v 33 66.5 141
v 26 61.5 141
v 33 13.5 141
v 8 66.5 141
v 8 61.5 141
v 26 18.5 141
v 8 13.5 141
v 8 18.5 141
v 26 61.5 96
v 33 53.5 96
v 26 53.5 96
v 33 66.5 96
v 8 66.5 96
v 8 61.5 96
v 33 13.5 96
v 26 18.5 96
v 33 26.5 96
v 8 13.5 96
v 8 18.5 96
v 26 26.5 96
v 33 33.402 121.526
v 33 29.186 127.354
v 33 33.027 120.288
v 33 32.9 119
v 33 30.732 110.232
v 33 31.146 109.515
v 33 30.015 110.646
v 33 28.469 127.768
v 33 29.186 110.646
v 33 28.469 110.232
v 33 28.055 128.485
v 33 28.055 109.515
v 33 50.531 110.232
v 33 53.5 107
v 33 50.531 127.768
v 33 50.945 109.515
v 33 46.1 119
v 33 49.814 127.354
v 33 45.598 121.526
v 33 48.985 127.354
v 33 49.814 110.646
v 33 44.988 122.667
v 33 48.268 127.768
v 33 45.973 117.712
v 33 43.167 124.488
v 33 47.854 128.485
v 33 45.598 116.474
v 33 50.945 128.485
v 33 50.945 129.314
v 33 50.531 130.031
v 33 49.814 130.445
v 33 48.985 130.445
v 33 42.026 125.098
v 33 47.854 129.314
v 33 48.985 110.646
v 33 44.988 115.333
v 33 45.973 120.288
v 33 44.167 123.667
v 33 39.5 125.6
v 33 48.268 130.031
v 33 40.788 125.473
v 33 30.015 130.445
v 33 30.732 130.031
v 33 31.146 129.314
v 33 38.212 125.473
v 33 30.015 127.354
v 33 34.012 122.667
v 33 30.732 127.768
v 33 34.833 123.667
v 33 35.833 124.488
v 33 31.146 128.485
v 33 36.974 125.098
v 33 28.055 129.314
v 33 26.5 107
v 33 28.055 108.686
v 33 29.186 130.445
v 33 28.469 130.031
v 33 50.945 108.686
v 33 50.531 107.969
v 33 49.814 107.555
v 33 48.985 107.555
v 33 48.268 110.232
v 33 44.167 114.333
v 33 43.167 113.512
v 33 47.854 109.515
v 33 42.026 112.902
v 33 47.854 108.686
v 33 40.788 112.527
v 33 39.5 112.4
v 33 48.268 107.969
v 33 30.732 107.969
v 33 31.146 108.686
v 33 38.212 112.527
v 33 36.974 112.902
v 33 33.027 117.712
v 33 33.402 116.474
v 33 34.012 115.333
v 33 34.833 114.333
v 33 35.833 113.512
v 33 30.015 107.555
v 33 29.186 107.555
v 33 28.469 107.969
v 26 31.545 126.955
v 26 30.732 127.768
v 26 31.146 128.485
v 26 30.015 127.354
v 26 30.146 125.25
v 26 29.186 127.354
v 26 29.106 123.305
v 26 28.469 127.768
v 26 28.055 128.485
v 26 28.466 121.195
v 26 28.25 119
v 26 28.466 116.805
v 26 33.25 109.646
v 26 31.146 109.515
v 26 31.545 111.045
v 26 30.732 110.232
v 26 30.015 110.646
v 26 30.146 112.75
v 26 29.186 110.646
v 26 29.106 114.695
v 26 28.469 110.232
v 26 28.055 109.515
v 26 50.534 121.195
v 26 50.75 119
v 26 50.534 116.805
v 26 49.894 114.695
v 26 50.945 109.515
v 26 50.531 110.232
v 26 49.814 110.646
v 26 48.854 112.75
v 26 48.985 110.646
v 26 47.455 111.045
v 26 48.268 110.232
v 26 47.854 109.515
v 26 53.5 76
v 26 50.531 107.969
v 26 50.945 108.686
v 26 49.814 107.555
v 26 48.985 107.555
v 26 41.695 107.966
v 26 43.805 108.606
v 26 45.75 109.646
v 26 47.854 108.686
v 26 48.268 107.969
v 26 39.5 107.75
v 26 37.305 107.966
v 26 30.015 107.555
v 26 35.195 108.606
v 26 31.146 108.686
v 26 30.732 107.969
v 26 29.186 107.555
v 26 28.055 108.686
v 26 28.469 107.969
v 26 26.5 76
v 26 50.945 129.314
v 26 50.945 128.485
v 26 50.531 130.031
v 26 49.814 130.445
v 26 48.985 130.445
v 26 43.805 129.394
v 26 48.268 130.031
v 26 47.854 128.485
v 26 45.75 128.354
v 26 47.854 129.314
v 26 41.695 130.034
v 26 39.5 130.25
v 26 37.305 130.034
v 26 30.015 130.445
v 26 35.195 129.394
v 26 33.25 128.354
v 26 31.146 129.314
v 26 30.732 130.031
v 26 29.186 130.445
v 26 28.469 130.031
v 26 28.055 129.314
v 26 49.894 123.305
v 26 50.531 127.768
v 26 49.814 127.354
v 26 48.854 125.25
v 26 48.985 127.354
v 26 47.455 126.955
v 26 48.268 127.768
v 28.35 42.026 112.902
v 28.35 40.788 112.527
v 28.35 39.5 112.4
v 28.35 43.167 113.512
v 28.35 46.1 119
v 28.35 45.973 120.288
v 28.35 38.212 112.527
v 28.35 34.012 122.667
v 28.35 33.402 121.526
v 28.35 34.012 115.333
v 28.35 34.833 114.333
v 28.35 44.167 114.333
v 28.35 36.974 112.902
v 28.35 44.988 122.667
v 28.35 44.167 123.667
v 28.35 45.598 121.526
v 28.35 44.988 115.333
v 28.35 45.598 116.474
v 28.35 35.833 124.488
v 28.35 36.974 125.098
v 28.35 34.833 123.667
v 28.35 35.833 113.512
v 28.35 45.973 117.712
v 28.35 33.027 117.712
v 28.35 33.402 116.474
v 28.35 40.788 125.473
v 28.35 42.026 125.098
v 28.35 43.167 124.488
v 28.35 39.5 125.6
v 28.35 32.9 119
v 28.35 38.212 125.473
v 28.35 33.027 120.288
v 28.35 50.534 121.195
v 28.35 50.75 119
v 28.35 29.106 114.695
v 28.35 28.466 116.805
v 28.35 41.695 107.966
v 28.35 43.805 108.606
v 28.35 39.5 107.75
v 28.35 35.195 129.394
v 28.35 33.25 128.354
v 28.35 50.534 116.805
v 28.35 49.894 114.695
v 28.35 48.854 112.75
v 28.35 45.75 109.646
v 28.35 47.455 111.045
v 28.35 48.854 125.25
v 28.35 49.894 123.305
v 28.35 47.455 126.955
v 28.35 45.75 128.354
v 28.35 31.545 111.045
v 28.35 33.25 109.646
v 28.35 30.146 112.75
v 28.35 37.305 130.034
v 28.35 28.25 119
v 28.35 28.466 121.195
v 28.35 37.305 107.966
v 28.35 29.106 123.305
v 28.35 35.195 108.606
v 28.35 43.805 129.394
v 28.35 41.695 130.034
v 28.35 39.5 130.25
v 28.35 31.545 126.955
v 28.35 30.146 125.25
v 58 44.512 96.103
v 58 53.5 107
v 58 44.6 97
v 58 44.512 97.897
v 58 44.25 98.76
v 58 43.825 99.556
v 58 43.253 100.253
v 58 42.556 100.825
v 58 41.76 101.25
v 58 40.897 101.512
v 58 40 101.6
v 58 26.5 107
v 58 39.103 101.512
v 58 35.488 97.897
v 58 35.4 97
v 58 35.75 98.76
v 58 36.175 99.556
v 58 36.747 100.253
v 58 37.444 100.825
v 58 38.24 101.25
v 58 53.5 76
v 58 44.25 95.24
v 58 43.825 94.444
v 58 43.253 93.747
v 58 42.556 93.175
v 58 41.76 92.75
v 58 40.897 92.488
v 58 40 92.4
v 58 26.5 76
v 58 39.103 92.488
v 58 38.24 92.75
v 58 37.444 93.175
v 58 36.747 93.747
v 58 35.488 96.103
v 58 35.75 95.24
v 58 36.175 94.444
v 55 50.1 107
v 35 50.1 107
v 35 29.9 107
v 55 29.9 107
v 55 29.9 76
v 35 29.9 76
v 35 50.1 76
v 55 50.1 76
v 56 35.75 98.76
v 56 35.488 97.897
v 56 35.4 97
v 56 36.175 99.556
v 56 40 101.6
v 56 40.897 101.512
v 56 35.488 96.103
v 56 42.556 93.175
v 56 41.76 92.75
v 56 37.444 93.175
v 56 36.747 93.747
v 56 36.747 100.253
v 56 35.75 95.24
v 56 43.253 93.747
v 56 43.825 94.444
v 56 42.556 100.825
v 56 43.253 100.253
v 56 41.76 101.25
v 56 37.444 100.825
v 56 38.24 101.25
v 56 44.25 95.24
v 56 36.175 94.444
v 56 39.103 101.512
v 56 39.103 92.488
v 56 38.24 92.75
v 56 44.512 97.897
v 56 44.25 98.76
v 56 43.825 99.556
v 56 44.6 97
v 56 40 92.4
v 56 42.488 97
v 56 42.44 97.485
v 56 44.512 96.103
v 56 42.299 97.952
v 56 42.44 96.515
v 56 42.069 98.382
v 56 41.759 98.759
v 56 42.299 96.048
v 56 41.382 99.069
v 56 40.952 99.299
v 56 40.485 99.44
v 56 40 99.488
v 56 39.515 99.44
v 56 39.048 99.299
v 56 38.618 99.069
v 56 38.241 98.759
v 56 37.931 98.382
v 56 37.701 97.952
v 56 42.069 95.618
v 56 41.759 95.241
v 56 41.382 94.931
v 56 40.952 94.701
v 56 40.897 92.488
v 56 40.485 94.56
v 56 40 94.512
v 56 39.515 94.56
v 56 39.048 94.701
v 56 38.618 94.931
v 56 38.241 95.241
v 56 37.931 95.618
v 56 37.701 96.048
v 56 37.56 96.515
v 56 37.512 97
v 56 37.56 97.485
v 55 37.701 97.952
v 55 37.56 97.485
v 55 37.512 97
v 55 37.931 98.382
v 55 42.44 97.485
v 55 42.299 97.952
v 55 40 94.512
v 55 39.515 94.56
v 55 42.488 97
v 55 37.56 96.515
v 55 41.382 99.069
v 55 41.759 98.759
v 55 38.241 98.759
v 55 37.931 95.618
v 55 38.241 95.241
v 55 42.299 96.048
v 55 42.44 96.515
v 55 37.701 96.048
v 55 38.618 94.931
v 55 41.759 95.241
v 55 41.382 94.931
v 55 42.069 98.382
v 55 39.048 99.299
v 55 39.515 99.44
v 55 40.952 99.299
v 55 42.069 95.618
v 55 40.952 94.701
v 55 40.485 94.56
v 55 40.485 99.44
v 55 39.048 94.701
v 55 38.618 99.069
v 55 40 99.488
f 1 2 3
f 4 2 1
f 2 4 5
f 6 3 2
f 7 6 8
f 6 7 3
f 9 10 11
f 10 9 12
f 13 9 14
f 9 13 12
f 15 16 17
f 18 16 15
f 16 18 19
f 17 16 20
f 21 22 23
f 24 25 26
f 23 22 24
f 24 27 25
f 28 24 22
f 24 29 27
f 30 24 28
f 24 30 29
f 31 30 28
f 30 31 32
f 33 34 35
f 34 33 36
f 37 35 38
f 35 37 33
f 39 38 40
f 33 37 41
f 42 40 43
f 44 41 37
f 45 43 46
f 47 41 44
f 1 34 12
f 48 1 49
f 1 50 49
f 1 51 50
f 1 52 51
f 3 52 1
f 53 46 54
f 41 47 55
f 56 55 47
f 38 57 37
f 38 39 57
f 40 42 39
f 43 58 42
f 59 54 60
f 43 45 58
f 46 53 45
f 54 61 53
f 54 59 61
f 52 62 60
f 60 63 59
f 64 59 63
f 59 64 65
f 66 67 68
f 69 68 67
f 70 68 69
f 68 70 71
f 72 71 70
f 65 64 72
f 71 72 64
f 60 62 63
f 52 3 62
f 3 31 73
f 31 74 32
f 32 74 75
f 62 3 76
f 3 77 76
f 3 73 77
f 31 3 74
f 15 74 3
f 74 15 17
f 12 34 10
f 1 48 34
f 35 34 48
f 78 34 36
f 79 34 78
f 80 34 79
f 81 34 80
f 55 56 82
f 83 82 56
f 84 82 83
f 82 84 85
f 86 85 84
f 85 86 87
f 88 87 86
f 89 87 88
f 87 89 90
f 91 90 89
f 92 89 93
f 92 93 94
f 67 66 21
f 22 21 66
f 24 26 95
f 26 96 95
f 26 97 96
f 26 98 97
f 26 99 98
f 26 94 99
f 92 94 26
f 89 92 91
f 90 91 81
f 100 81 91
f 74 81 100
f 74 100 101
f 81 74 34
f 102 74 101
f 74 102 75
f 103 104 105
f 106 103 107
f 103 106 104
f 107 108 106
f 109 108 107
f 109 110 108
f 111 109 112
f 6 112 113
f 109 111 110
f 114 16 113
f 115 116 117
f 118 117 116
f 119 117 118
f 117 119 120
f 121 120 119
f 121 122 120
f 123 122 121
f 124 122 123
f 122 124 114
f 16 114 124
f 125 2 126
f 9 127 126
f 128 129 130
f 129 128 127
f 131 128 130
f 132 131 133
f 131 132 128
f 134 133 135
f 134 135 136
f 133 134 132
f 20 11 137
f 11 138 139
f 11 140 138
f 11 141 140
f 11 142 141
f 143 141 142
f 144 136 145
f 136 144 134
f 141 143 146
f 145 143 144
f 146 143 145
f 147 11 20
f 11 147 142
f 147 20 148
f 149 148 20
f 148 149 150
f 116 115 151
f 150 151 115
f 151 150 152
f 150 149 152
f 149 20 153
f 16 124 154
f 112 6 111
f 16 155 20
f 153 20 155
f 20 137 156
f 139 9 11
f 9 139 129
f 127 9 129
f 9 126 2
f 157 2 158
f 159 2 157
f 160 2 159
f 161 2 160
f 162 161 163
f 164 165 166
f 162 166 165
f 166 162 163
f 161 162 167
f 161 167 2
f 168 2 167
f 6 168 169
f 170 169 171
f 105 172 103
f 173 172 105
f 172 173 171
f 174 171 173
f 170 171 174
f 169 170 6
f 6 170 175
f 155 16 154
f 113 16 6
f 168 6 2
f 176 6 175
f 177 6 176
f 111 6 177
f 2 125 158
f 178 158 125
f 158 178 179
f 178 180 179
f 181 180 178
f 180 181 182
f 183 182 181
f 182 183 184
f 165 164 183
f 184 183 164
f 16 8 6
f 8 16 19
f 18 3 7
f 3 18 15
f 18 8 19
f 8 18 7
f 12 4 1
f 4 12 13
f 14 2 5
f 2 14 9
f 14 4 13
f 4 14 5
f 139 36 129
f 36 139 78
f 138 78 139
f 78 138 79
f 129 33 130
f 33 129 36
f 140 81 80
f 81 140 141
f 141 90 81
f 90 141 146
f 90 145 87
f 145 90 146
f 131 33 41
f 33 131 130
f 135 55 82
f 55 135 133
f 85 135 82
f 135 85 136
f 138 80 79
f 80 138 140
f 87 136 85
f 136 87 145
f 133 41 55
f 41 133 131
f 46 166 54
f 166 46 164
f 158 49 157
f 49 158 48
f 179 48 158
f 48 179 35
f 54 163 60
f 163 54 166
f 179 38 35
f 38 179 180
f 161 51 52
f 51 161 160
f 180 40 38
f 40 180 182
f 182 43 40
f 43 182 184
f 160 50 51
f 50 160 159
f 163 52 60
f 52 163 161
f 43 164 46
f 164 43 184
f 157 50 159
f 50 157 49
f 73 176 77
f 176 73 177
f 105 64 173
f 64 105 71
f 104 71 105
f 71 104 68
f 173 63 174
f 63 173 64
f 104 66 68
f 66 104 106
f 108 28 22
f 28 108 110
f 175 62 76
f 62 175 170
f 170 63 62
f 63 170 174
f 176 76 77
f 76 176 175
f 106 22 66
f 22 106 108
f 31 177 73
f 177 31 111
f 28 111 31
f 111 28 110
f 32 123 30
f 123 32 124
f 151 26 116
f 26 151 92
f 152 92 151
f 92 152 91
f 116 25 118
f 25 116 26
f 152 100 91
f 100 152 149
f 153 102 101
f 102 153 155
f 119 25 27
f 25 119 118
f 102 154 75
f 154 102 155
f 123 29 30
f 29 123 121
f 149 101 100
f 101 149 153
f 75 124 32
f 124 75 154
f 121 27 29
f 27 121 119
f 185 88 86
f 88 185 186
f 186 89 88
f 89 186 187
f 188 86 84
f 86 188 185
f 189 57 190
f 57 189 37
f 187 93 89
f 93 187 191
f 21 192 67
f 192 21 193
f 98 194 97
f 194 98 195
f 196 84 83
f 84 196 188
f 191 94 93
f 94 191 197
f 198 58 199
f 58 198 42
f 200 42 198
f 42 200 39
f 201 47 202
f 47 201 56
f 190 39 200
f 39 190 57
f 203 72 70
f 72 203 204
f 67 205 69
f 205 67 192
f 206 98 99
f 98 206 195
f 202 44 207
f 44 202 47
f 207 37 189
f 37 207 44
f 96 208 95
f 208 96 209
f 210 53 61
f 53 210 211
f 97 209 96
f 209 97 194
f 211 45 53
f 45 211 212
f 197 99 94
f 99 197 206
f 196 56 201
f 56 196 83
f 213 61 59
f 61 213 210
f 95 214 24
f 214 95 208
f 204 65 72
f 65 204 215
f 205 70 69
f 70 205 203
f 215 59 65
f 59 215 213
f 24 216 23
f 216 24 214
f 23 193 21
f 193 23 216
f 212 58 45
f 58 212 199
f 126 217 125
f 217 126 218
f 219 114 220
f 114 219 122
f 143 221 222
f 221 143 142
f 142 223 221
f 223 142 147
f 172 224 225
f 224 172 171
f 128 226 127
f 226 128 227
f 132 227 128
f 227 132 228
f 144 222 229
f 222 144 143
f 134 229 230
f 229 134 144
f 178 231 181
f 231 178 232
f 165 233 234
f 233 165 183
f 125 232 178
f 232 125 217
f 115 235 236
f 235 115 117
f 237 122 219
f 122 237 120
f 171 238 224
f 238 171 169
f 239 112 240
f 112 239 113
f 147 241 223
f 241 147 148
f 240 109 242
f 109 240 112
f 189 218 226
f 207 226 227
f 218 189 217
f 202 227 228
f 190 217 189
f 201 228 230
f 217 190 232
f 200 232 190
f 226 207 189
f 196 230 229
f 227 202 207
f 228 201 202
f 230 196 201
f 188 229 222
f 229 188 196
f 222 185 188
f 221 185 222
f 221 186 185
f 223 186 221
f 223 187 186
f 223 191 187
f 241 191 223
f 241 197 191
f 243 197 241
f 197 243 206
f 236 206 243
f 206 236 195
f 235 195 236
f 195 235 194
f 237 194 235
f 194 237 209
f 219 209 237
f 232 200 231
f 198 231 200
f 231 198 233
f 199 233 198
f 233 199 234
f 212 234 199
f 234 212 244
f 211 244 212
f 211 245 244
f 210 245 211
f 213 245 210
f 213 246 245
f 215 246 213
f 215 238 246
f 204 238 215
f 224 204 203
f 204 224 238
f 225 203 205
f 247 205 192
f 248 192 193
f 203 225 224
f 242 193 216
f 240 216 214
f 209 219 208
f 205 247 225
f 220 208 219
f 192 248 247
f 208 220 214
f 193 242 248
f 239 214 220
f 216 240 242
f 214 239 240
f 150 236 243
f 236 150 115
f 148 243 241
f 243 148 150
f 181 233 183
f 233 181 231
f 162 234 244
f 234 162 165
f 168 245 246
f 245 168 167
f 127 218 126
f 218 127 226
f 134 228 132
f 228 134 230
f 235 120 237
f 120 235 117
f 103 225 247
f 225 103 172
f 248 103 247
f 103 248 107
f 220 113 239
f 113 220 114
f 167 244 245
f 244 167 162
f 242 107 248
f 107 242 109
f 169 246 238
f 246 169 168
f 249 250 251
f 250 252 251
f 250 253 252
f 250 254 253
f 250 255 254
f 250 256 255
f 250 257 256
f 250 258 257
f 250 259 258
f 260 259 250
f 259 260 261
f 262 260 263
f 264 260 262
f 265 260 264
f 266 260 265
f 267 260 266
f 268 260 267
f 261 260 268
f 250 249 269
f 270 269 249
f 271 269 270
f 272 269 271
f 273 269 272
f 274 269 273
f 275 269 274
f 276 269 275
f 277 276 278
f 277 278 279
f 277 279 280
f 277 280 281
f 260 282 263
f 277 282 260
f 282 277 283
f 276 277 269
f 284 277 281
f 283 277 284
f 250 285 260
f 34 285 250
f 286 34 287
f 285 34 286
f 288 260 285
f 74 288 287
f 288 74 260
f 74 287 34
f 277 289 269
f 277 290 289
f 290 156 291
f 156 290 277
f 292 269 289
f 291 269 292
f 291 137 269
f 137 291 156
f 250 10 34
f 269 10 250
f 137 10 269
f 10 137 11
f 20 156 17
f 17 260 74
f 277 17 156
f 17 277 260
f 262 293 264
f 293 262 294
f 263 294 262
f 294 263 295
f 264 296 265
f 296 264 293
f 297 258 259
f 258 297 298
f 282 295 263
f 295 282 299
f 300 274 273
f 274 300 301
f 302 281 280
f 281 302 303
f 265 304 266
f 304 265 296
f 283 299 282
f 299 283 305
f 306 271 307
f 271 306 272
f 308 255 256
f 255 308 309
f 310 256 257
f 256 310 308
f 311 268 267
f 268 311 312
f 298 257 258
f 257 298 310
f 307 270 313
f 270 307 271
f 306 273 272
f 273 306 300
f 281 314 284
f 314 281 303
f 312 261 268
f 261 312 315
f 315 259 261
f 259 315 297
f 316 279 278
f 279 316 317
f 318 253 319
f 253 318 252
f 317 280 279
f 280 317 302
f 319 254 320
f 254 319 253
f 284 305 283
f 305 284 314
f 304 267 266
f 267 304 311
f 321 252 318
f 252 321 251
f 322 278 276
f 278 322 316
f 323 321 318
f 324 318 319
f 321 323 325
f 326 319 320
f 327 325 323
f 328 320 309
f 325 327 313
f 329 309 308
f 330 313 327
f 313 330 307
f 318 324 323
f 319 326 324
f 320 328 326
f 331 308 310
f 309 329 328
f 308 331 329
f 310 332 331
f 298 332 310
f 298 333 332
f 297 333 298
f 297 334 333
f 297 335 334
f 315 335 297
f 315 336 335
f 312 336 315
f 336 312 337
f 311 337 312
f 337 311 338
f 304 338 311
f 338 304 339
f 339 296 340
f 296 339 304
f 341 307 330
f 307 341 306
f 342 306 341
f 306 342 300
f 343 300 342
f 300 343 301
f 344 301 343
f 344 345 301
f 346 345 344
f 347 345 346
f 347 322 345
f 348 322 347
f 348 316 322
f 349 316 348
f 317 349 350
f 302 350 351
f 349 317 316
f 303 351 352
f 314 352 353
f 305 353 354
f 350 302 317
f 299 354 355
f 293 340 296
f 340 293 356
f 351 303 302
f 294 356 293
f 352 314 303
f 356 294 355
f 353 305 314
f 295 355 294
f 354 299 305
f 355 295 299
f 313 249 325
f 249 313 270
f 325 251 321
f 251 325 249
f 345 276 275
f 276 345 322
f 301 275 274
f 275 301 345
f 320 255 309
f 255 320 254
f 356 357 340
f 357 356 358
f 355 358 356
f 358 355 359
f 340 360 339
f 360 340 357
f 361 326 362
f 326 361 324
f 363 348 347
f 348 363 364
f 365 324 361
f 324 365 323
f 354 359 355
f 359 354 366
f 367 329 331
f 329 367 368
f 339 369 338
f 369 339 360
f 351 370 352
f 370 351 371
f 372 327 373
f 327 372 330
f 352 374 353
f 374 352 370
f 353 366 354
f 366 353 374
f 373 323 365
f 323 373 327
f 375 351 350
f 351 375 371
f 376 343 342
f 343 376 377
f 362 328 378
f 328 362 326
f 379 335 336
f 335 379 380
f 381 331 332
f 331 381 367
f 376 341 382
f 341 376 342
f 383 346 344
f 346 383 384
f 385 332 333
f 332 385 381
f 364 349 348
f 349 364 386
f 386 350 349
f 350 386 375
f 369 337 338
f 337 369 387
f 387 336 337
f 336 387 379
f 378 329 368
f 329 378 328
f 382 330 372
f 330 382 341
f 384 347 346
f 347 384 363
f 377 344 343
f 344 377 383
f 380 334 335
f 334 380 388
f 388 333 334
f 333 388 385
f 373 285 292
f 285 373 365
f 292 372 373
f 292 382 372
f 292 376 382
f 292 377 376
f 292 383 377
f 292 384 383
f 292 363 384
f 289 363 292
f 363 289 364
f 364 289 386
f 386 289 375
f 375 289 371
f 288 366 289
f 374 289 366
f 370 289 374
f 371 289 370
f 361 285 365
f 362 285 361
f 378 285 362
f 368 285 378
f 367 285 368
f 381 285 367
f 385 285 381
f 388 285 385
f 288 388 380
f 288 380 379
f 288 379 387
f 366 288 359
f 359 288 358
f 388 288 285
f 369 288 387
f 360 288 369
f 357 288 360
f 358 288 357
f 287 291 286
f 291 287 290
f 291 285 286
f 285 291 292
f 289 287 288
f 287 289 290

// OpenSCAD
// file: MCAD/constants.scad
// MIT license


TAU = 6.2831853071; //2*PI, see http://tauday.com/
PI = TAU/2;

// translates a imperial measurement in inches to meters
mm_per_inch = 25.4;
// file: MCAD/math.scad
// MIT license

include <constants.scad>

function deg(angle) = 360*angle/TAU;
// file: MCAD/motors.scad
// Copyright 2010 D1plo1d

// This library is dual licensed under the GPL 3.0 and the GNU Lesser General Public License as per http://creativecommons.org/licenses/LGPL/2.1/ .

include <math.scad>


//generates a motor mount for the specified nema standard #.
module stepper_motor_mount(nema_standard,slide_distance=0, mochup=true, tolerance=0) {
	//dimensions from:
	// http://www.numberfactory.com/NEMA%20Motor%20Dimensions.htm
	if (nema_standard == 17)
	{
		_stepper_motor_mount(
			motor_shaft_diameter = 0.1968*mm_per_inch,
			motor_shaft_length = 0.945*mm_per_inch,
			pilot_diameter = 0.866*mm_per_inch,
			pilot_length = 0.80*mm_per_inch,
			mounting_bolt_circle = 1.725*mm_per_inch,
			bolt_hole_size = 3.5,
			bolt_hole_distance = 1.220*mm_per_inch,
			slide_distance = slide_distance,
			mochup = mochup,
			tolerance=tolerance);
	}
	if (nema_standard == 23)
	{
		_stepper_motor_mount(
			motor_shaft_diameter = 0.250*mm_per_inch,
			motor_shaft_length = 0.81*mm_per_inch,
			pilot_diameter = 1.500*mm_per_inch,
			pilot_length = 0.062*mm_per_inch,
			mounting_bolt_circle = 2.625*mm_per_inch,
			bolt_hole_size = 0.195*mm_per_inch,
			bolt_hole_distance = 1.856*mm_per_inch,
			slide_distance = slide_distance,
			mochup = mochup,
			tolerance=tolerance);
	}
	
}


//inner mehod for creating a stepper motor mount of any dimensions
module _stepper_motor_mount(
	motor_shaft_diameter,
	motor_shaft_length,
	pilot_diameter,
	pilot_length,
	mounting_bolt_circle,
	bolt_hole_size,
	bolt_hole_distance,
	slide_distance = 0,
	motor_length = 40, //arbitray - not standardized
	mochup,
	tolerance = 0
)
{
	union()
	{
	// == centered mount points ==
	//mounting circle inset
	translate([0,slide_distance/2,0]) circle(r = pilot_diameter/2 + tolerance);
	square([pilot_diameter,slide_distance],center=true);
	translate([0,-slide_distance/2,0]) circle(r = pilot_diameter/2 + tolerance);

	//todo: motor shaft hole
	
	//mounting screw holes
	for (x = [-1,1])
	{
		for (y = [-1,1])
		{
			translate([x*bolt_hole_distance/2,y*bolt_hole_distance/2,0])
			{
				translate([0,slide_distance/2,0]) circle(bolt_hole_size/2 + tolerance);
				translate([0,-slide_distance/2,0]) circle(bolt_hole_size/2 + tolerance);
				square([bolt_hole_size+2*tolerance,slide_distance],center=true);
			}
		}
	}
	// == motor mock-up ==
	//motor box
	if (mochup == true)
	{
		%translate([0,0,-5]) cylinder(h = 5, r = pilot_diameter/2);
		%translate(v=[0,0,-motor_length/2])
		{
			cube(size=[bolt_hole_distance+bolt_hole_size+5,bolt_hole_distance+bolt_hole_size+5,motor_length], center = true);
		}
		//shaft
		%translate(v=[0,0,-(motor_length-motor_shaft_length-2)/2])
		{
			%cylinder(r=motor_shaft_diameter/2,h=motor_length+motor_shaft_length--1, center = true);
		}
	}
	}
}
// file: triangle.scad
//Copyright Austin Floyd 2013
//http://www.thingiverse.com/thing:119050
//license GNU GPL
//austin.floyd at 3DprintGeeks (dot) com

//global variables.. if not set when calling wedge it will use these values. 
//The prefix st_ is to "namespace" the global variables so they're not accidentally overridden elsewhere


//The top angle of the right triangle
st_wedgeAngle=12; // [0.01:89.99]

//The height of the triangle (width auto-generated based on this)
st_wedgeHeight=27; // [0.01:200]

//Depth (thickness) of triangle
st_wedgeWidth=2.2; // [0.01:200]

//Increased or decreased percentage (50% would be 0.5) of top point vs bottom point
st_topFactor=0.5; // [0,0.1,0.2,0.3,0.4,0.5,0.6,0.7,0.8,0.9,1]

//Whether or not to center on x/y/z
st_center=false; // [true, false]

//Flip it upside down
st_invert=false; // [true, false]

//default wedge
//wedge();

//demo of several different wedges
demo();

module demo() {
	translate([0,0,15])
	wedge(angle=75,height=10, wedgeWidth=5);

	wedge(angle=75,height=5,topFactor=.25, center=true, wedgeWidth=10);

	translate([0,0,-15])
	wedge(angle=35,height=13,center=true);

	translate([0,0,-30])
	wedge(angle=35,height=6, center=true, invert=true);
}


module wedge(angle=st_wedgeAngle, height=st_wedgeHeight, wedgeWidth=st_wedgeWidth, topFactor=st_topFactor, center=st_center, invert=st_invert) {
	angle2=180-90-angle;
	hyp=height/sin(angle2);
	width=sqrt(pow(hyp,2)-pow(height,2));
	if (!invert) {
		triangle(height, width, center, topFactor, wedgeWidth);
	}
	if (invert) {
		rotate(180,[1,0,0])
		triangle(height, width, center, topFactor, wedgeWidth);
	}
}
module triangle(height=5, width=5, center=false, topFactor=0.5, wedgeWidth) {
	triangles=[[0,1,4],[5,4,1],		// top
					[1,2,5],[2,3,4],		// sides
					[3,0,4], [4,5,2],	//back
           	[2,1,0], [2,0,3]]; // base
	halfWidth=width/2;
	halfWWidth=wedgeWidth/2;
	topWidth=wedgeWidth*topFactor;
	halfTopWidth=topWidth/2;
	topHalfDiff=(wedgeWidth-topWidth)/2;
	halfHeight=height/2;
	if (center) {
		polyhedron(
  			points=[/*0*/[halfWidth,halfWWidth,-halfHeight],/*1*/[halfWidth,-halfWWidth,-halfHeight],				//front point
					  /*2*/[-halfWidth,-halfWWidth,-halfHeight],       /*3*/[-halfWidth,halfWWidth,-halfHeight], //rear point
           	  /*4*/[-halfWidth,halfTopWidth,height-halfHeight], /*5*/[-halfWidth,-halfTopWidth,height-halfHeight] ], //front/rear top 
  			triangles=triangles
		);
	}
	else {
		polyhedron(
  			points=[/*0*/[width,wedgeWidth,0],         			 /*1*/[width,0,0],				    ////front point
					  /*2*/[0,0,0],       					  			 /*3*/[0,wedgeWidth,0], 		    //rear point
           	  /*4*/[0,wedgeWidth-topHalfDiff,height],/*5*/[0,topHalfDiff,height] ],//front/back top 
  			triangles=triangles
		);
	}
}
// file: pulley.scad
use <MCAD/nuts_and_bolts.scad>;

module pulley_wall(xside)
{
   hull(){
       translate([0,0,0]) cube([20,3,2]);
       translate([8.5,0,18]) cube([3,3,2]);
       if (xside==0){
          translate([8.5,7,0]) cube([1,1,1]);
          translate([10,4,9]) rotate([90,0,0]) cylinder(r=3,h=10);
          
         } else {
          translate([8.5,-5,0]) cube([1,1,1]);
          translate([10,8,9]) rotate([90,0,0]) cylinder(r=3,h=10);
         }
       }
    
}

module pulley_body()
{
    translate([0,0,0])   pulley_wall(1);
    translate([0,22,0])  pulley_wall(0);
    %translate([10,-2,9]) rotate([90,0,180]) boltHole(3,length=28);
    %translate([10,27,9]) rotate([90,0,180]) nutHole(3); 
}

module pulley_cuts()
{
    translate([10,-2,9]) rotate([90,0,180]) boltHole(3,length=28);
    translate([10,25,9]) rotate([90,0,180]) nutHole(3);  
    translate([10,27,9]) rotate([90,0,180]) nutHole(3); 
}

module pulley()
{
	difference(){
        translate([23,21,-12]) rotate([90,0,270]) pulley_body();
        translate([23,21,-12]) rotate([90,0,270]) pulley_cuts();
        }
    

}



pulley();
// file: sensor.scad
module sensor_mount_body()
{
 union() { 
      translate([44,2,0]) rotate([90,0,0]) cube([10,15,4]); 
      translate([44,18,0]) rotate([90,0,0]) cube([10,15,4]);
      
      translate([50,-2,0]) rotate([90,0,90]) cube([20,15,4]);
    //  translate([0,-2,0]) rotate([90,0,90]) cube([20,15,4]);
      
      
      }
}

module sensor_mount_cuts()
{

      translate([50,7.5,7.5]) rotate([90, 0, 90]) cylinder(r=2.5, h=10, center=true, $fn=12);

}

module sensor_mount()
{
   difference() {
    sensor_mount_body();
    sensor_mount_cuts();
    
     
     }
}

sensor_mount();
// file: nemamount.scad
include <MCAD/units.scad>;
include <MCAD/materials.scad>
include <MCAD/stepper.scad>
include <MCAD/motors.scad>
use <MCAD/shapes.scad>;
use <pulley.scad>;
$fn = 32;




module motor_support(ht)
{
   difference(){
	  translate([-22.5,23.5,0]) rotate([90,0,0]) motor_support_body(ht);
      translate([0,1,0]) rotate([90,0,0]) motor_support_cuts(ht);
      }
}

module motor_support_body(ht)
{
	cube([45,ht,48.5]);

}


module motor_support_cuts(ht)
{
// Motor shaft/pulley cutout.
      translate([0,.1,0]) rotate([90, 0, 0]) cylinder(r=12, h=ht*2, center=true, $fn=60);
      // NEMA 17 stepper motor mounting screws.
      for (x = [-1, 1]) for (z = [-1, 1]) {
        scale([x, 1, z]) translate([15.5, .1, 15.5]) {
          rotate([90, 0, 0]) cylinder(r=4, h=ht*2, center=true, $fn=12);
          }
        }
}



module nema_geared_cutout()
{
    //pulley opening
    translate([16,1,21]) rotate([90,0,0]){
      cylinder (h=22, r=6.6);

      rotate([0,0,45]) {
        translate([14,0,0]) cylinder(h=22, r=1.6, $fn=12);
        translate([0,14,0]) cylinder(h=22, r=1.6, $fn=12);
        translate([-14,0,0]) cylinder(h=22, r=1.6, $fn=12);
        translate([0,-14,0]) cylinder(h=22, r=1.6, $fn=12);
      }
     
    }

    //gearhead indentation
    translate([16,-5,21]) rotate([90,0,0]) cylinder (h=3.35, r=11.25);

  
    
}

module nema_cutout()
{
// Motor shaft/pulley cutout.
      rotate([90, 0, 0]) cylinder(r=12, h=20, center=true, $fn=60);
      // NEMA 17 stepper motor mounting screws.
      for (x = [-1, 1]) for (z = [-1, 1]) {
        scale([x, 1, z]) translate([15.5, -5, 15.5]) {
          rotate([90, 0, 0]) cylinder(r=1.65, h=20, center=true, $fn=12);
          }
        }
}

module nema_motor()
{
   union(){
     nema_mount();
     %translate([0,-4,1]) rotate([90,0,0]) motor(Nema17, size=NemaLong , dualAxis=false);
     }
}

module nema_motor_inverse()
{
   union(){
     nema_mount_inverse();
     %translate([0,-4,1]) rotate([90,0,0]) motor(Nema17, size=NemaLong , dualAxis=false);
     }
}

module nema_geared_motor_inverse()
{
   union(){
     nema_geared_inverse();
     %translate([16,-7,22]) rotate([90,0,180]) motor(Nema17, NemaLong, dualAxis=false);
    
     }
}

module nema_geared_motor()
{
   union(){
     nema_geared_mount();
     %translate([16,-7,22]) rotate([90,0,180]) motor(Nema17, NemaLong, dualAxis=false);
    
     }
}

module nema_geared_mount()
{
   difference(){
      union(){
           translate([-6,-6,0]) rotate([90,0,0]) cube([45,45,7]);
           translate([-6,-13,-4]) rotate([0,0,0]) cube([45,25,5]);
           translate([-6,-13,44]) rotate([0,0,0]) cube([45,25,5]);
           }
      translate([0,0,1]) nema_geared_cutout();
      }


}

module nema_geared_inverse()
{
   difference(){
      union(){
           translate([-6,-6,0]) rotate([90,0,0]) cube([45,45,7]);
           translate([-6,-31,-4]) rotate([0,0,0]) cube([45,25,5]);
           translate([-6,-31,44]) rotate([0,0,0]) cube([45,25,5]);
           }
      translate([0,0,1]) nema_geared_cutout();
      }


}

module nema_mount_inverse()
{
   difference(){
      union(){
        translate([-22.5,0,-21.5]) rotate([90,0,0]) cube([45,45,5]);
        translate([-22.5,-5,-25]) rotate([0,0,0]) cube([45,25,5]);
        }
      translate([0,0,1]) nema_cutout();
      }
   //nema_cutout();
}

module nema_mount()
{
   difference(){
      union(){
        translate([-22.5,0,-21.5]) rotate([90,0,0]) cube([45,45,5]);
        translate([-22.5,-25,-25]) rotate([0,0,0]) cube([45,25,5]);
        }
      translate([0,0,1]) nema_cutout();
      }
   //nema_cutout();
}

module pulley_mount()
{
   
        translate([-22.5,0,-21.5]) rotate([90,0,0]) cube([45,45,5]);
        translate([-22.5,-25,-25]) rotate([0,0,0]) cube([45,25,5]);
	translate([0,5,0]) rotate([90,0,0]) cylinder(r=18,h=5);
	translate([-11.25,28,0]) rotate([0,0,-90]) pulley();     
}

//nema_motor_inverse();
translate([0,0,40]) rotate([270,0,0]) pulley_mount();
//translate([0,0,0]) motor_support(40);
//nema_geared_motor();
//nema_geared_motor_inverse();
// file: vslot.scad
include <MCAD/units.scad>;
include <MCAD/materials.scad>
use <MCAD/shapes.scad>;
use <bom.scad>;

vslot_color_black = [0.27, 0.27, 0.3];
vslot_color = Aluminum;

module vslot(length=50, sections=1, finish, cutout=0) {
	size = sections * 20;
	bom(str("vslot20x", size, "x", length), str("v-slot 20x", size, " (", length , "mm)"), ["rail", "extrusion", "structure"]);
	cutext = [[12.00,4.50],[10.00,4.50],[8.20,2.78],[8.20,5.50],[6.56,5.50],[3.90,2.84],[3.90,0.21],[3.69,0.00],[3.90,-0.21],[3.90,-2.84],[6.56,-5.50],[8.20,-5.50],[8.20,-2.78],[10.00,-4.50],[12.00,-4.50]];
	cutint = [[16.10,0.21],[16.10,2.84],[12.70,6.24],[12.70,8.78],[7.30,8.78],[7.30,6.24],[3.90,2.84],[3.90,0.21],[3.69,0.00],[3.90,-0.21],[3.90,-2.84],[7.30,-6.24],[7.30,-8.78],[12.70,-8.78],[12.70,-6.24],[16.10,-2.84],[16.10,-0.21],[16.31,0.00],];
	cutcorner = [[8.20,8.20],[6.57,8.20],[6.57,7.66],[7.66,6.57],[8.20,6.57]];

	module profile() {
        
		difference() {
         
			translate([0,0,length/2])
			roundedBox(20 * sections, 20, length, 1.5);
         if (cutout == 0){
			for(i = [0,180]) rotate([0,0,-i]) translate([10 * (sections - 1), 0, -epsilon/2]) {
				linear_extrude(length+20) polygon(cutext);
				translate([5,-2.89,-20]) cube([10,5.78,length+40]);
			}
          
			for(i = [90,270]) rotate([0,0,-i])
				for(j = [0:sections-1]) translate([0, (sections - 1) * 10 - 20 * j, -epsilon/2]) {
					linear_extrude(length+epsilon) polygon(cutext);
					translate([5,-2.89,-20]) cube([10,5.78,length+40]);
				}

			for(i = [0:sections-1]) translate([i * 20 - 10 * (sections - 1),0,-epsilon/2])
				cylinder(length+20, 2.1, 2.1);

			for(i = [90,270]) rotate([0,0,-i])
				translate([0,(sections - 1) * 10,-epsilon/2])
				linear_extrude(length+epsilon) polygon(cutcorner);
			for(i = [ 0,180]) rotate([0,0,-i])
				translate([(sections - 1) * 10,0,-epsilon/2])
				linear_extrude(length+epsilon) polygon(cutcorner);

			if(sections > 1)
				for(i = [0:sections-2]) translate([(sections - 3) * 10 - i * 20, 0, -epsilon/2])
					linear_extrude(length+epsilon) polygon(cutint);
                      }
		}
	}

      if (cutout == 1){
		 translate([0,0,length/2]) box(20 * sections, 20.2, length);
          } else {
	     if(finish)
		   color(finish) profile();
	     else
		   color(vslot_color) profile();
         }
}

module vslot20x20(length, finish) { vslot(length, 1, finish); }
module vslot20x20_cutout(length, finish) { vslot(length, 1, finish, 1); }


module vslot20x40(length, finish) { vslot(length, 2, finish); }
module vslot20x40_cutout(length, finish) { vslot(length, 2, finish, 1); }

module vslot20x60(length, finish) { vslot(length, 3, finish); }
module vslot20x60_cutout(length, finish) { vslot(length, 3, finish, 1); }

module vslot20x80(length, finish) { vslot(length, 4, finish); }
module vslot20x80_cutout(length, finish) { vslot(length, 4, finish, 1); }


module vslot_test() {
	$fn = 32;

	vslot20x20(100);

	translate([0, 40, 0])
	vslot20x40(100, vslot_color_black);

	translate([0, 80, 0])
	vslot20x60(100);

	translate([0, 120, 0])
	vslot20x80(100, vslot_color_black);

    translate([0,140,0]) vslot20x20_cutout(100);
}

vslot_test();
// file: bom.scad
module bom(code, desc, category) {
	echo(str("BOM: ",code," - ", desc, "; ", category));
}
// file: MCAD/nuts_and_bolts.scad
// Copyright 2010 D1plo1d

// This library is dual licensed under the GPL 3.0 and the GNU Lesser General Public License as per http://creativecommons.org/licenses/LGPL/2.1/ .

//testNutsAndBolts();

module SKIPtestNutsAndBolts()
{
	$fn = 360;
	translate([0,15])nutHole(3, proj=2);
	boltHole(3, length= 30, proj=2);
}

MM = "mm";
INCH = "inch"; //Not yet supported

//Based on: http://www.roymech.co.uk/Useful_Tables/Screws/Hex_Screws.htm
METRIC_NUT_AC_WIDTHS =
[
	-1, //0 index is not used but reduces computation
	-1,
	-1,
	6.40,//m3
	8.10,//m4
	9.20,//m5
	11.50,//m6
	-1,
	15.00,//m8
	-1,
	19.60,//m10
	-1,
	22.10,//m12
	-1,
	-1,
	-1,
	27.70,//m16
	-1,
	-1,
	-1,
	34.60,//m20
	-1,
	-1,
	-1,
	41.60,//m24
	-1,
	-1,
	-1,
	-1,
	-1,
	53.1,//m30
	-1,
	-1,
	-1,
	-1,
	-1,
	63.5//m36
];
METRIC_NUT_THICKNESS =
[
	-1, //0 index is not used but reduces computation
	-1,
	-1,
	2.40,//m3
	3.20,//m4
	4.00,//m5
	5.00,//m6
	-1,
	6.50,//m8
	-1,
	8.00,//m10
	-1,
	10.00,//m12
	-1,
	-1,
	-1,
	13.00,//m16
	-1,
	-1,
	-1,
	16.00//m20
	-1,
	-1,
	-1,
	19.00,//m24
	-1,
	-1,
	-1,
	-1,
	-1,
	24.00,//m30
	-1,
	-1,
	-1,
	-1,
	-1,
	29.00//m36
];

COURSE_METRIC_BOLT_MAJOR_THREAD_DIAMETERS =
[//based on max values
	-1, //0 index is not used but reduces computation
	-1,
	-1,
	2.98,//m3
	3.978,//m4
	4.976,//m5
	5.974,//m6
	-1,
	7.972,//m8
	-1,
	9.968,//m10
	-1,
	11.966,//m12
	-1,
	-1,
	-1,
	15.962,//m16
	-1,
	-1,
	-1,
	19.958,//m20
	-1,
	-1,
	-1,
	23.952,//m24
	-1,
	-1,
	-1,
	-1,
	-1,
	29.947,//m30
	-1,
	-1,
	-1,
	-1,
	-1,
	35.940//m36
];

module nutHole(size, units=MM, tolerance = +0.0001, proj = -1)
{
	//takes a metric screw/nut size and looksup nut dimensions
	radius = METRIC_NUT_AC_WIDTHS[size]/2+tolerance;
	height = METRIC_NUT_THICKNESS[size]+tolerance;
	if (proj == -1)
	{
		cylinder(r= radius, h=height, $fn = 6, center=[0,0]);
	}
	if (proj == 1)
	{
		circle(r= radius, $fn = 6);
	}
	if (proj == 2)
	{
		translate([-radius/2, 0])
			square([radius*2, height]);
	}
}

module boltHole(size, units=MM, length, tolerance = +0.0001, proj = -1)
{
	radius = COURSE_METRIC_BOLT_MAJOR_THREAD_DIAMETERS[size]/2+tolerance;
//TODO: proper screw cap values
	capHeight = METRIC_NUT_THICKNESS[size]+tolerance; //METRIC_BOLT_CAP_HEIGHTS[size]+tolerance;
	capRadius = METRIC_NUT_AC_WIDTHS[size]/2+tolerance; //METRIC_BOLT_CAP_RADIUS[size]+tolerance;

	if (proj == -1)
	{
	translate([0, 0, -capHeight])
		cylinder(r= capRadius, h=capHeight);
	cylinder(r = radius, h = length);
	}
	if (proj == 1)
	{
		circle(r = radius);
	}
	if (proj == 2)
	{
		translate([-capRadius/2, -capHeight])
			square([capRadius*2, capHeight]);
		square([radius*2, length]);
	}
}
// file: MCAD/shapes.scad
/*
 *  OpenSCAD Shapes Library (www.openscad.org)
 *  Copyright (C) 2009  Catarina Mota
 *  Copyright (C) 2010  Elmo Mäntynen
 *
 *  License: LGPL 2.1 or later
*/

// 2D Shapes
//ngon(sides, radius, center=false);

// 3D Shapes
//box(width, height, depth);
//roundedBox(width, height, depth, factor);
//cone(height, radius);
//ellipticalCylinder(width, height, depth);
//ellipsoid(width, height);
//tube(height, radius, wall, center = false);
//tube2(height, ID, OD, center = false);
//ovalTube(width, height, depth, wall, center = false);
//hexagon(height, depth);
//octagon(height, depth);
//dodecagon(height, depth);
//hexagram(height, depth);
//rightTriangle(adjacent, opposite, depth);
//equiTriangle(side, depth);
//12ptStar(height, depth);

//----------------------

// size is a vector [w, h, d]
module box(width, height, depth) {
  cube([width, height, depth], true);
}

// size is a vector [w, h, d]
module roundedBox(width, height, depth, radius) {
  size=[width, height, depth];
  cube(size - [2*radius,0,0], true);
  cube(size - [0,2*radius,0], true);
  for (x = [radius-size[0]/2, -radius+size[0]/2],
       y = [radius-size[1]/2, -radius+size[1]/2]) {
    translate([x,y,0]) cylinder(r=radius, h=size[2], center=true);
  }
}

module cone(height, radius, center = false) {
  cylinder(height, radius, 0, center);
}

module ellipticalCylinder(w,h, height, center = false) {
  scale([1, h/w, 1]) cylinder(h=height, r=w, center=center);
}

module ellipsoid(w, h, center = false) {
  scale([1, h/w, 1]) sphere(r=w/2, center=center);
}

// wall is wall thickness
module tube(height, radius, wall, center = false) {
  difference() {
    cylinder(h=height, r=radius, center=center);
    cylinder(h=height, r=radius-wall, center=center);
  }
}

// wall is wall thickness
module tube2(height, ID, OD, center = false) {
  difference() {
    cylinder(h=height, r=OD/2, center=center);
    cylinder(h=height, r=ID/2, center=center);
  }
}

// wall is wall thickness
module ovalTube(height, rx, ry, wall, center = false) {
  difference() {
    scale([1, ry/rx, 1]) cylinder(h=height, r=rx, center=center);
    scale([(rx-wall)/rx, (ry-wall)/rx, 1]) cylinder(h=height, r=rx, center=center);
  }
}

// size is the XY plane size, height in Z
module hexagon(size, height) {
  boxWidth = size/1.75;
  for (r = [-60, 0, 60]) rotate([0,0,r]) cube([boxWidth, size, height], true);
}

// size is the XY plane size, height in Z
module octagon(size, height) {
  intersection() {
    cube([size, size, height], true);
    rotate([0,0,45]) cube([size, size, height], true);
  }
}

// size is the XY plane size, height in Z
module dodecagon(size, height) {
  intersection() {
    hexagon(size, height);
    rotate([0,0,90]) hexagon(size, height);
  }
}

// size is the XY plane size, height in Z
module hexagram(size, height) {
  boxWidth=size/1.75;
  for (v = [[0,1],[0,-1],[1,-1]]) {
    intersection() {
      rotate([0,0,60*v[0]]) cube([size, boxWidth, height], true);
      rotate([0,0,60*v[1]]) cube([size, boxWidth, height], true);
    }
  }
}

module rightTriangle(adjacent, opposite, height) {
  difference() {
    translate([-adjacent/2,opposite/2,0]) cube([adjacent, opposite, height], true);
    translate([-adjacent,0,0]) {
      rotate([0,0,atan(opposite/adjacent)]) dislocateBox(adjacent*2, opposite, height+2);
    }
  }
}

module equiTriangle(side, height) {
  difference() {
    translate([-side/2,side/2,0]) cube([side, side, height], true);
    rotate([0,0,30]) dislocateBox(side*2, side, height);
    translate([-side,0,0]) {
      rotate([0,0,60]) dislocateBox(side*2, side, height);
    }
  }
}

module 12ptStar(size, height) {
  starNum = 3;
  starAngle = 360/starNum;
  for (s = [1:starNum]) {
    rotate([0, 0, s*starAngle]) cube([size, size, height], true);
  }
}

//-----------------------
//MOVES THE ROTATION AXIS OF A BOX FROM ITS CENTER TO THE BOTTOM LEFT CORNER
module dislocateBox(w, h, d) {
  translate([0,0,-d/2]) cube([w,h,d]);
}

//-----------------------
// Tests
//module test2D_ellipse(){ellipse(10, 5);}
module test_ellipsoid(){ellipsoid(10, 5);}

//module test2D_egg_outline(){egg_outline();}
// file: MCAD/boxes.scad
// Library: boxes.scad
// Version: 1.0
// Author: Marius Kintel
// Copyright: 2010
// License: BSD

// roundedBox([width, height, depth], float radius, bool sidesonly);

// EXAMPLE USAGE:
// roundedBox([20, 30, 40], 5, true);

// size is a vector [w, h, d]
module roundedBox(size, radius, sidesonly)
{
  rot = [ [0,0,0], [90,0,90], [90,90,0] ];
  if (sidesonly) {
    cube(size - [2*radius,0,0], true);
    cube(size - [0,2*radius,0], true);
    for (x = [radius-size[0]/2, -radius+size[0]/2],
           y = [radius-size[1]/2, -radius+size[1]/2]) {
      translate([x,y,0]) cylinder(r=radius, h=size[2], center=true);
    }
  }
  else {
    cube([size[0], size[1]-radius*2, size[2]-radius*2], center=true);
    cube([size[0]-radius*2, size[1], size[2]-radius*2], center=true);
    cube([size[0]-radius*2, size[1]-radius*2, size[2]], center=true);

    for (axis = [0:2]) {
      for (x = [radius-size[axis]/2, -radius+size[axis]/2],
             y = [radius-size[(axis+1)%3]/2, -radius+size[(axis+1)%3]/2]) {
        rotate(rot[axis])
          translate([x,y,0])
          cylinder(h=size[(axis+2)%3]-2*radius, r=radius, center=true);
      }
    }
    for (x = [radius-size[0]/2, -radius+size[0]/2],
           y = [radius-size[1]/2, -radius+size[1]/2],
           z = [radius-size[2]/2, -radius+size[2]/2]) {
      translate([x,y,z]) sphere(radius);
    }
  }
}
// file: MCAD/materials.scad
/*
 * Material colors.
 * 
 * Originally by Hans Häggström, 2010.
 * Dual licenced under Creative Commons Attribution-Share Alike 3.0 and LGPL2 or later
 */

// Material colors
Oak = [0.65, 0.5, 0.4];
Pine = [0.85, 0.7, 0.45];
Birch = [0.9, 0.8, 0.6];
FiberBoard = [0.7, 0.67, 0.6];
BlackPaint = [0.2, 0.2, 0.2];
Iron = [0.36, 0.33, 0.33];
Steel = [0.65, 0.67, 0.72];
Stainless = [0.45, 0.43, 0.5];
Aluminum = [0.77, 0.77, 0.8];
Brass = [0.88, 0.78, 0.5];
Transparent = [1, 1, 1, 0.2];

// Example, uncomment to view
//color_demo();

module color_demo(){
    // Wood
    colorTest(Oak, 0, 0);
    colorTest(Pine, 1, 0);
    colorTest(Birch, 2, 0);

    // Metals
    colorTest(Iron, 0, 1);
    colorTest(Steel, 1, 1);
    colorTest(Stainless, 2, 1);
    colorTest(Aluminum, 3, 1);

    // Mixboards
    colorTest(FiberBoard, 0, 2);

    // Paints
    colorTest(BlackPaint, 0, 3);
}

module colorTest(col, row=0, c=0) {
  color(col) translate([row * 30,c*30,0]) sphere(r=10);
}
// file: MCAD/units.scad
/*
 * Basic units.
 * 
 * Originally by Hans Häggström, 2010.
 * Dual licenced under Creative Commons Attribution-Share Alike 3.0 and LGPL2 or later
 */


mm = 1;
cm = 10 * mm;
dm = 100 * mm;
m = 1000 * mm;

inch = 25.4 * mm;

X = [1, 0, 0];
Y = [0, 1, 0];
Z = [0, 0, 1];

M3 = 3*mm;
M4 = 4*mm;
M5 = 5*mm;
M6 = 6*mm;
M8 = 8*mm;


// When a small distance is needed to overlap shapes for boolean cutting, etc.
epsilon = 0.01*mm;
// main file
include <MCAD/units.scad>;
include <MCAD/materials.scad>
include <MCAD/boxes.scad>;
use <MCAD/shapes.scad>;
use <MCAD/nuts_and_bolts.scad>;
use <bom.scad>;
use <vslot.scad>;
use <nemamount.scad>;
use <sensor.scad>;
use <pulley.scad>;
use <triangle.scad>;

$fn = 32;

rod_length = 500;

module zmotor_body()
{
	translate([20,22.5-5,135]) rotate([270,90,0]) nema_geared_motor();
	translate([33-7,26.5,96-20]) cube([25+7,27,31]); // X mount vslot
}

module zmotor_cuts()
{
   // Vertical Rod
  %translate([45,40,(-1 *  rod_length)+95]) rotate([0,0,0]) vslot20x20(rod_length);
  translate([45,40,10]) rotate([0,0,0]) vslot20x20_cutout(110);	
  translate([56,40,101-4]) rotate([90,0,270]) boltHole(5, length=18);	
}

module zmotor_mount()
{
	difference(){
		zmotor_body();
		zmotor_cuts();
	}
	
}


zmotor_mount();
